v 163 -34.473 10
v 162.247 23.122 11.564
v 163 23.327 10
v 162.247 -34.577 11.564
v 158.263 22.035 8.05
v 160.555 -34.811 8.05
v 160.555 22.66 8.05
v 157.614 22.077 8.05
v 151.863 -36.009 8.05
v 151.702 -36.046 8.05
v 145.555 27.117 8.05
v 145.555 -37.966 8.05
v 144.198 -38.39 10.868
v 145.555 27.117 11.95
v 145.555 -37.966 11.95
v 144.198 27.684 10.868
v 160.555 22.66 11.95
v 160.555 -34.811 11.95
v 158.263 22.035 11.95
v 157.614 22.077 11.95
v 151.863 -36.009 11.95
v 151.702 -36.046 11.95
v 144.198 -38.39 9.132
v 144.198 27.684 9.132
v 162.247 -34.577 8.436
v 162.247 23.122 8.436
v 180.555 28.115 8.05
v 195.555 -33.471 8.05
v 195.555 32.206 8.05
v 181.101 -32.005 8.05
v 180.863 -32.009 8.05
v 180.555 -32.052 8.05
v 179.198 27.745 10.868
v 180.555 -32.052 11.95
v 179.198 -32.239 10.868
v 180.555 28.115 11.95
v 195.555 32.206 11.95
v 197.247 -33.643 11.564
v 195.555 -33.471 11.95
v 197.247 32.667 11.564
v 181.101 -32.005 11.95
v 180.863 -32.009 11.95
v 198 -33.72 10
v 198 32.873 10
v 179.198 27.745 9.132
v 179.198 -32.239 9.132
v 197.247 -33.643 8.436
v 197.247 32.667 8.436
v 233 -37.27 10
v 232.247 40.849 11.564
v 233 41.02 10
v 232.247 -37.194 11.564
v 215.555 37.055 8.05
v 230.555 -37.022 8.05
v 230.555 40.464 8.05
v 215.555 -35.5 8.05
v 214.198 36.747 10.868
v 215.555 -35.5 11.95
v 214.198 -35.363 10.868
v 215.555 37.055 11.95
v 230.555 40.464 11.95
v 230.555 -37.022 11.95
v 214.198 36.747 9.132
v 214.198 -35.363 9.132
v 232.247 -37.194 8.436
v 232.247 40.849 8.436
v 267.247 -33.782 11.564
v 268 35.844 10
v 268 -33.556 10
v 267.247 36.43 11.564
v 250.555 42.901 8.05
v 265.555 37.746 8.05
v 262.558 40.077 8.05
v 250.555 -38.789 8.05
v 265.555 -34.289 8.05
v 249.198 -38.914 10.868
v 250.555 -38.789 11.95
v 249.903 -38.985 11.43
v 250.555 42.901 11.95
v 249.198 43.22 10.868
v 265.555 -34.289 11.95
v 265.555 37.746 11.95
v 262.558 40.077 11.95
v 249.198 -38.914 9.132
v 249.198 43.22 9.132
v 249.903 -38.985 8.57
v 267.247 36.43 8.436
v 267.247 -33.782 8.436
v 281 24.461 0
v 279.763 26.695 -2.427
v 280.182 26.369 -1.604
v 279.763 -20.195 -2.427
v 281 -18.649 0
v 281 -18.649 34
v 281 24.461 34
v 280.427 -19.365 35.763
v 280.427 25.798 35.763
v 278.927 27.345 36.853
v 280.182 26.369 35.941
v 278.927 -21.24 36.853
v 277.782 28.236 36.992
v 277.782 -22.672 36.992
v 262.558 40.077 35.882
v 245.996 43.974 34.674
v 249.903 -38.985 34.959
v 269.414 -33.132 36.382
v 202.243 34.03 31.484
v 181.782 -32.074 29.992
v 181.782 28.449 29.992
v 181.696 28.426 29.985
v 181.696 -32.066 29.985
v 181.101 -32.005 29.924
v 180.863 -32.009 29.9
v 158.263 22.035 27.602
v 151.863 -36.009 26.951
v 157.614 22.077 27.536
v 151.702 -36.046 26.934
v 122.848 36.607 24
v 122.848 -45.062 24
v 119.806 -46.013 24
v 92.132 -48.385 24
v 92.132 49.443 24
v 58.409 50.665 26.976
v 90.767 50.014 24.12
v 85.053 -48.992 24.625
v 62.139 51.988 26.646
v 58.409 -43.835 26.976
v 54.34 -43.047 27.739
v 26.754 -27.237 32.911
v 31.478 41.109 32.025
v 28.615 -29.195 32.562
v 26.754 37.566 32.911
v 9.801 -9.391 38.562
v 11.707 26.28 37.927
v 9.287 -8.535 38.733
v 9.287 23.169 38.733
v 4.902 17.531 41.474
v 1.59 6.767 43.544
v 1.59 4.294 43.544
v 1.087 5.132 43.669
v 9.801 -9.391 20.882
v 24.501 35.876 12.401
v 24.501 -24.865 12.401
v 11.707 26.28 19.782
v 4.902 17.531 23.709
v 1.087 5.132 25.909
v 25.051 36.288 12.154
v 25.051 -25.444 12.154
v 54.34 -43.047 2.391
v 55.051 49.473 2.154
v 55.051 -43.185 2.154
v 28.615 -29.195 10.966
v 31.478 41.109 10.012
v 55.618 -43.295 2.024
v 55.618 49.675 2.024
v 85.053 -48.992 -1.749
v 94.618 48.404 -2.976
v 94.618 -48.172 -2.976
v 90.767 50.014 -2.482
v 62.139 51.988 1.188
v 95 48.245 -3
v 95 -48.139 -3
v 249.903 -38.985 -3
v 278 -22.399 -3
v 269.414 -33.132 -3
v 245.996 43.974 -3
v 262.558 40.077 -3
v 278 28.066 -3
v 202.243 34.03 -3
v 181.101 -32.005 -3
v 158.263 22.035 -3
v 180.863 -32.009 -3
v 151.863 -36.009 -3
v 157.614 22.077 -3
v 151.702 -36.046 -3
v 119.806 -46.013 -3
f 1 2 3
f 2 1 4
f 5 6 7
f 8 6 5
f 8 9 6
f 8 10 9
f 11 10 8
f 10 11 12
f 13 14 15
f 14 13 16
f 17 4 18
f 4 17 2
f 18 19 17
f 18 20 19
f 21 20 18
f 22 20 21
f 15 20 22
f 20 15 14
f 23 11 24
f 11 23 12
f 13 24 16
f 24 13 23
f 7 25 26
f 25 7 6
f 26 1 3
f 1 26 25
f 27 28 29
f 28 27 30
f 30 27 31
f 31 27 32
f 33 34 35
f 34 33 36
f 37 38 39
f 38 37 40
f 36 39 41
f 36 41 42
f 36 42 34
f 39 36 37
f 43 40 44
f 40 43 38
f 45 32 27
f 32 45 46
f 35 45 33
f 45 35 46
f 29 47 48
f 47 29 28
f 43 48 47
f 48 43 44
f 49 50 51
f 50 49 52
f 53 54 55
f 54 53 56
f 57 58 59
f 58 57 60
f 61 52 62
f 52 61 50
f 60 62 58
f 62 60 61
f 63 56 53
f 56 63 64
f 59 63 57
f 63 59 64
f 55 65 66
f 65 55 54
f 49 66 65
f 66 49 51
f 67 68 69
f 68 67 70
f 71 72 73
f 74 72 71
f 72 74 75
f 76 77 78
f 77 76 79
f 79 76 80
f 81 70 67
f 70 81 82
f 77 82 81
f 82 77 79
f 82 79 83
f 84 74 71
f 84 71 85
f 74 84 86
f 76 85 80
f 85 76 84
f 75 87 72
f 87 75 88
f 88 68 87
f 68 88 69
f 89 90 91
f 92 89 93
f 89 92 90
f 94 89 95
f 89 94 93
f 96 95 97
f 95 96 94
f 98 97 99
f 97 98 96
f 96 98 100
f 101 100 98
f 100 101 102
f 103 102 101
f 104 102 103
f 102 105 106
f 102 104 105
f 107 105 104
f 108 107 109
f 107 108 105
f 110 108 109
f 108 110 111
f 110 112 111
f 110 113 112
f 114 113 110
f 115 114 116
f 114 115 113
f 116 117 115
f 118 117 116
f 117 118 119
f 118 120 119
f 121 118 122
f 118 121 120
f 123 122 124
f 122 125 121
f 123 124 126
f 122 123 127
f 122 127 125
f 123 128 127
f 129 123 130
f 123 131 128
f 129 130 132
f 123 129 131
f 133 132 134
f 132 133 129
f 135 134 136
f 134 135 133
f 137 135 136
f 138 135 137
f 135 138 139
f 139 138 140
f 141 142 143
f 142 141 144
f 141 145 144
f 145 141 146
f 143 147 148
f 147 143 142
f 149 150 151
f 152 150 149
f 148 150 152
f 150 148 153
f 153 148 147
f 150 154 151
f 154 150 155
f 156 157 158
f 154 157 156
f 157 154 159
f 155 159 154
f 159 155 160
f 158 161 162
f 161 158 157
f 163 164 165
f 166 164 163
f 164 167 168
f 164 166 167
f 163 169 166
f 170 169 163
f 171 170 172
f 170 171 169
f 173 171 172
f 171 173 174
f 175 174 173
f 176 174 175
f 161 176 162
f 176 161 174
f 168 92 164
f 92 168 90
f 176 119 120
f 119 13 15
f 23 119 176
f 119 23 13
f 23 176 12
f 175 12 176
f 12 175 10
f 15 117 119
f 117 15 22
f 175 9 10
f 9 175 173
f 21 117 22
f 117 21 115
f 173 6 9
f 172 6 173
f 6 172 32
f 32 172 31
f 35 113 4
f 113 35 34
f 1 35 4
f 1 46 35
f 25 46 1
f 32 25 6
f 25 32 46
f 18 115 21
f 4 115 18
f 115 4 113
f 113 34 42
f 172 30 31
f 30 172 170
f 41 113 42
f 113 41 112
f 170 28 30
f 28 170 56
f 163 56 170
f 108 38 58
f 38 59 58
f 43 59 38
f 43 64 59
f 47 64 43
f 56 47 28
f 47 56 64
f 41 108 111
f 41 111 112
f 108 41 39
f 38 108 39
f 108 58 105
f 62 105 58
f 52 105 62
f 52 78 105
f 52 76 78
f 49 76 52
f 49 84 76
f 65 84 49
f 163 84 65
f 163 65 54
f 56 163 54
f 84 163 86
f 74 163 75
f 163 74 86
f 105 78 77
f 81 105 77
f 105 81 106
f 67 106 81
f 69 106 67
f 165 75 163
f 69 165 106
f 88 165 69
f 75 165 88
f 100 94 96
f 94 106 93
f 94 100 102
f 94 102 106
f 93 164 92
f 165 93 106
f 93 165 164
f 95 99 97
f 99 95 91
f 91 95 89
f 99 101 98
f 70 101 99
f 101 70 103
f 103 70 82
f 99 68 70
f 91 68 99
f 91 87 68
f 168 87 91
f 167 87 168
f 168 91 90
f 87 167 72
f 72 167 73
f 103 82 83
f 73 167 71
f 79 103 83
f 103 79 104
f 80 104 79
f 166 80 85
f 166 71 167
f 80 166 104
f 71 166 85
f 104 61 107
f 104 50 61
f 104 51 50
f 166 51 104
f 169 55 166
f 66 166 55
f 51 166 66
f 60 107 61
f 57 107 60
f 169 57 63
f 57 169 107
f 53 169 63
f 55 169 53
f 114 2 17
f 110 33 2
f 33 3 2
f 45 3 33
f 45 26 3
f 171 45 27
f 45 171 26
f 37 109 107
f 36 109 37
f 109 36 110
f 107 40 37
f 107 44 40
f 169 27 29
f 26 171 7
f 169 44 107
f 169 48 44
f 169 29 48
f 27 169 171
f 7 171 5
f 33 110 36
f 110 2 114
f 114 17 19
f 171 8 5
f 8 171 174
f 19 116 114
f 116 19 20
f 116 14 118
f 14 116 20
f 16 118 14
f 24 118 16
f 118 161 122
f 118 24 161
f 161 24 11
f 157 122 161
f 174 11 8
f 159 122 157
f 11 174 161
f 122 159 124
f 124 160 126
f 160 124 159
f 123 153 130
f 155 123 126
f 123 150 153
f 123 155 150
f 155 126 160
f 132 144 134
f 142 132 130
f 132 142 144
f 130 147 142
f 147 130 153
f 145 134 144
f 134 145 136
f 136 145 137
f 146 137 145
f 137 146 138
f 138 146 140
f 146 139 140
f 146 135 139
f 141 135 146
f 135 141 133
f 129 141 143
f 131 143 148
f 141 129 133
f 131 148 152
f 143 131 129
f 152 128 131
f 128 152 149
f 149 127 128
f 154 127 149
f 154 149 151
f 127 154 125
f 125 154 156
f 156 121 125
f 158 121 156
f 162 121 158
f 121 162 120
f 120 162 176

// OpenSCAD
shape="soft";// [soft,mid,hard]
//slit = 5; //[1:15]
COLOR="Orange"; // [Navy,Green,Orange,Gray]

color(COLOR)
//difference(){    
intersection(){


    if (shape=="soft"){    //前反りソフト
        difference(){
        rotate(a=90,v=[1,0,0])
            linear_extrude(height=120,center=true,convexity=10)
            offset(r=3)
            polygon(points=[[0,41],[0,30],[26,15],[56,5],[95,0],[278,0],[278,34],[182,27],[123,21],[92,21],[58,24],[26,30],[8,36]]);
        
        // 横を抜く穴
        translate([0,0,10])
        rotate(a=90,v=[1,0,0])
        for(i = [0 : 1 : 4])
        hull(){
            translate([146+35*i,0,0])
            cylinder(h=100, r=2, center = true);
            translate([161+35*i,0,0])
            cylinder(h=100, r=2, center = true);
            }
        }
    } 
    

    
    else if(shape=="mid"){
        rotate(a=90,v=[1,0,0])
        linear_extrude(height=120,center=true,convexity=10)
        offset(r=3)
            polygon(points=[[0,48],[0,35],[16,24],[36,14],[57,7],[78,2],[100,0],[290,0],[290,35],[200,28],[135,22],[106,22],[62,26],[30,33],[10,40]]);
    }
    
    
    else if(shape=="hard"){   //前反りハード
        rotate(a=90,v=[1,0,0])
        linear_extrude(height=120,center=true,convexity=10)
        offset(r=3)
            polygon(points=[[0,8],[0,17.5],[0,8],[0,17.5],[290,35],[290,0],[230,0],[230,12],[170,12],[100,0],[62,0]]);
    }


    //上断面図
    translate(v=[0,-50,0])
        linear_extrude(height=120,center=true,convexity=10)
        offset(r=-1)
            polygon(points=[[0,55],[9,40],[28,20],[54,6],[85,0],[120,3],[152,13],[181,17],[250,10],[270,16],[286,36],[290,56],[281,77],[263,91],[246,95],[202,85],[158,73],[91,101],[62,103],[31,92],[11,77],[4,68]]);
}

/*
for(i = [0: slit*3 :290])
    translate([i,0,-3]) 
    rotate(a=45, v=[0,1,0])
    scale(v=[1,200,1])
    cube(slit*0.75,center=true);
}
*/
